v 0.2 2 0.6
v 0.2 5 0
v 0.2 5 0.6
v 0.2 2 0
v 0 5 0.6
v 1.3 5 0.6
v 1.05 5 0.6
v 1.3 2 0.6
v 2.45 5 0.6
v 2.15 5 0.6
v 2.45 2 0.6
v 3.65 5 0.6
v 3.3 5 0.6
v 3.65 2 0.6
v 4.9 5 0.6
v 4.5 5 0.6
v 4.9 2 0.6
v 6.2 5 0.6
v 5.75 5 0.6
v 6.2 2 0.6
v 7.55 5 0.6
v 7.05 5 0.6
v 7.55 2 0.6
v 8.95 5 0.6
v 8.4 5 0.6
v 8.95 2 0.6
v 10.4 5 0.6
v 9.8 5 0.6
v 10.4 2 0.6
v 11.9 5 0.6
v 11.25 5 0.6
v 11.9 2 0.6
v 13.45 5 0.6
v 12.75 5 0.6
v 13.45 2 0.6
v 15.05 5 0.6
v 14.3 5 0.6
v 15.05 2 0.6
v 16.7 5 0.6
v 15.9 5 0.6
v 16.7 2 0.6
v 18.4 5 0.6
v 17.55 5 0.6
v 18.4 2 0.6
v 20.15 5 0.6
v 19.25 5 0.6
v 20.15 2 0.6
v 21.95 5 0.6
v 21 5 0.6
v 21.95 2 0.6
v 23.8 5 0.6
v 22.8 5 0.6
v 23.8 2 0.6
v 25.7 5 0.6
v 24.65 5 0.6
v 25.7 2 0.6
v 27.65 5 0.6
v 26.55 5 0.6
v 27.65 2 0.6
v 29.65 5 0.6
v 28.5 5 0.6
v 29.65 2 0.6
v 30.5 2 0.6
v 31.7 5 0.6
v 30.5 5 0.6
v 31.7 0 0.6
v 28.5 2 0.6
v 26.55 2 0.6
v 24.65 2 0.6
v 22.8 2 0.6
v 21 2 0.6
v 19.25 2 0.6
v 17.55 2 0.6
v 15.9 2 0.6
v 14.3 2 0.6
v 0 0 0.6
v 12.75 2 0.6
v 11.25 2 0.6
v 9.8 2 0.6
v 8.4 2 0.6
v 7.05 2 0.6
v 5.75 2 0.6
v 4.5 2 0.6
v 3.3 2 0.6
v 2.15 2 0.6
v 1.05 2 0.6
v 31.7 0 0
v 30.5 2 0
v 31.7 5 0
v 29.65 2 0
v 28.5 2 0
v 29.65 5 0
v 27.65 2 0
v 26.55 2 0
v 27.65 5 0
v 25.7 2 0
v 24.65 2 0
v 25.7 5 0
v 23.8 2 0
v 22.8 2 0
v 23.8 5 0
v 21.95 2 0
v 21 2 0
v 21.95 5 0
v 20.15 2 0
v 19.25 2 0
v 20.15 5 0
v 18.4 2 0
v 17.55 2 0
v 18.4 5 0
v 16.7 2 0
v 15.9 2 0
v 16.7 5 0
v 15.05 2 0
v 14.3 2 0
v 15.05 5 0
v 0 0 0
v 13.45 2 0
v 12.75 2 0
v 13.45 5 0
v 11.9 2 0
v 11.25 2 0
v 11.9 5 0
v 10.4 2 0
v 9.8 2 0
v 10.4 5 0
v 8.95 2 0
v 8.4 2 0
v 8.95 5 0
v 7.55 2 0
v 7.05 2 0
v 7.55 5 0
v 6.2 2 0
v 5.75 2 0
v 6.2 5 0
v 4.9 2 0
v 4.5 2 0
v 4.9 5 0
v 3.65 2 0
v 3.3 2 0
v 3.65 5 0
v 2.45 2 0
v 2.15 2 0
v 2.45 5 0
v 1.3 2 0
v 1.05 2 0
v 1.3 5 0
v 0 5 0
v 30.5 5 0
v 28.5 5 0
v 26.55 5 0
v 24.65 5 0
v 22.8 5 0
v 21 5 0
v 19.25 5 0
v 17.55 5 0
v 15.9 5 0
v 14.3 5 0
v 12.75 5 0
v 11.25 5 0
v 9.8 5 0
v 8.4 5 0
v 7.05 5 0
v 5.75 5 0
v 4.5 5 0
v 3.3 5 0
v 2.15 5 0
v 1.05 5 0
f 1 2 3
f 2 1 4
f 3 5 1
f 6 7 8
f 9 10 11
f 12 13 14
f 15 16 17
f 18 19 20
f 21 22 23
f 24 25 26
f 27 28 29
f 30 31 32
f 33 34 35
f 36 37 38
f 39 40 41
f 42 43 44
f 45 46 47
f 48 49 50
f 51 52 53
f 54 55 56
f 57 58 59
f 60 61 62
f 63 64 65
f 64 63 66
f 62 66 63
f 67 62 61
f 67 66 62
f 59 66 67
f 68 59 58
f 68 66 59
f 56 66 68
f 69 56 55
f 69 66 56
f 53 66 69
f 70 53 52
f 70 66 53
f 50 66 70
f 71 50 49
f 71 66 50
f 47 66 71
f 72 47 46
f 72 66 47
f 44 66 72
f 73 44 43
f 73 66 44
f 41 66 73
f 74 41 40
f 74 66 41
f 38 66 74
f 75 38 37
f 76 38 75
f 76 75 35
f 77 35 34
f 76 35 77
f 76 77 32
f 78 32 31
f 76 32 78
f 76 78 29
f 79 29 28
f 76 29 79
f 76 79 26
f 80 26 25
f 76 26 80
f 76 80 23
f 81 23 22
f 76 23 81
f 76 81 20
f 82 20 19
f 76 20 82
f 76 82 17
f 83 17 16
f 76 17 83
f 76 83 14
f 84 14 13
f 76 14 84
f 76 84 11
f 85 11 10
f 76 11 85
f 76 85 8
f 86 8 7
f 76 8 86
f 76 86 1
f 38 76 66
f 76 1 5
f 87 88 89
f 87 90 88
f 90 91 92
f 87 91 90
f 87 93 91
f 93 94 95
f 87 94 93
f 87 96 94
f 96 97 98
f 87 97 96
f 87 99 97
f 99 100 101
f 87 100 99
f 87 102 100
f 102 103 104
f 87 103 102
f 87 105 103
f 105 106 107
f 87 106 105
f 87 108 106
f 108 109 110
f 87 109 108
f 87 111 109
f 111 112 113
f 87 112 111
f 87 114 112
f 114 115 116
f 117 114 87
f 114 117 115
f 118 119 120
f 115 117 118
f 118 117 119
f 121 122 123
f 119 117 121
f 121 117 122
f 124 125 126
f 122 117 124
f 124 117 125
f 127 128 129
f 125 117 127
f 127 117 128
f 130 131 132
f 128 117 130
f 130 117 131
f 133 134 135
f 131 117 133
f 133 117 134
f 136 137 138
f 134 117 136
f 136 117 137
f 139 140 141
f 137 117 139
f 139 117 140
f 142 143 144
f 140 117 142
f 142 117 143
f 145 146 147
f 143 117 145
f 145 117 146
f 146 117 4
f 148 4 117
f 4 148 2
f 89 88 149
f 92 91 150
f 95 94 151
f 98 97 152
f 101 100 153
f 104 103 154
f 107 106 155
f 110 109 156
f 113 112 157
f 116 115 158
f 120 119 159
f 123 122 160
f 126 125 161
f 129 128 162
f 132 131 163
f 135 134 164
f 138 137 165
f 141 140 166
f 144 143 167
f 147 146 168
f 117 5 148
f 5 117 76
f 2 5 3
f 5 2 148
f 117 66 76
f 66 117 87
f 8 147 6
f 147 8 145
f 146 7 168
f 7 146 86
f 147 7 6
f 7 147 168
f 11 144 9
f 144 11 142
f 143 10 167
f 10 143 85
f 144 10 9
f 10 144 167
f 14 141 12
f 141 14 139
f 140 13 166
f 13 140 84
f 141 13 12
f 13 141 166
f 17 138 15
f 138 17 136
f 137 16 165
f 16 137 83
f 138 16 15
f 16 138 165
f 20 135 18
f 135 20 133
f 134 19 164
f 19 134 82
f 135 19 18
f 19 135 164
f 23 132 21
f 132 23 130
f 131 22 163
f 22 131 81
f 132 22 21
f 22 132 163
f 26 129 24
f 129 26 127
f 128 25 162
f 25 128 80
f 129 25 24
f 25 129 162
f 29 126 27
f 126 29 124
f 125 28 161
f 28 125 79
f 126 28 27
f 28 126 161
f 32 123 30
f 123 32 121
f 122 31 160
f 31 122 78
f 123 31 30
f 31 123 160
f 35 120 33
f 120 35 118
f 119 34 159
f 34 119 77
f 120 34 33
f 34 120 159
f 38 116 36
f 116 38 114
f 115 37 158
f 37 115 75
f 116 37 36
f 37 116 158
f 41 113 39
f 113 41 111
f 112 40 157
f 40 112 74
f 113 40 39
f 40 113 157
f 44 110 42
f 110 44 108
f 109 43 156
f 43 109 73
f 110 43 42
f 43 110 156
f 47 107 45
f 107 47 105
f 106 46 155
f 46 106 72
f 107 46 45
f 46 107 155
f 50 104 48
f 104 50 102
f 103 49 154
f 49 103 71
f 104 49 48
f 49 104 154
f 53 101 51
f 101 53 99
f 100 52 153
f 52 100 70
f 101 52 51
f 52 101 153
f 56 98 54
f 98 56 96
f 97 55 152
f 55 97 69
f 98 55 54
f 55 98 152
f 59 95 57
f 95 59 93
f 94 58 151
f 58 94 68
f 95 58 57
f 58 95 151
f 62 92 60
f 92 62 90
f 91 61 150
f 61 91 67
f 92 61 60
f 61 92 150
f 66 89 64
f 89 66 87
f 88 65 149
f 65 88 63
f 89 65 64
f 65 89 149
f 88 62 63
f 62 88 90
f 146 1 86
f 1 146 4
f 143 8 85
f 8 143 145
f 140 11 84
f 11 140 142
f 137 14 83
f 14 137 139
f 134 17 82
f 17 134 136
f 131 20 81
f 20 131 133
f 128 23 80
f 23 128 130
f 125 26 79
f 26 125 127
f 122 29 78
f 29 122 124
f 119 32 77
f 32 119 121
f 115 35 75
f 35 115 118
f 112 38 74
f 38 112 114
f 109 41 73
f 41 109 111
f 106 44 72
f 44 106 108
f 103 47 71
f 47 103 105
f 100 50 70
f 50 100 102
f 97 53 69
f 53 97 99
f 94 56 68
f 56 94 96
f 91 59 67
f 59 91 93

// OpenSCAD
// [FL_INDEX: keywords="openscad, 3d_parametric, Calibration_Comb_-_customizable, csg_solid" | COT="Parametric OpenSCAD design from 3DCodeverse"]
// Title: Calibration Comb - customizable

//make a calibration comb any size you want
//for checking slicer and printer settings
//mark peeters 2-1-2014

/* [calibration comb settings] */
//smallest tooth width (mm)
start_w=0.2;
//largest tooth (mm)(not exact but close)
end_w=1;
//tooth width increments(mm)
step_w=.05;
//space between teeth(mm)
spacing=1;
//tooth length(mm)
comb_l=5;
//tooth height(mm)
comb_h=.6;
//solid comb base height(mm)
base=2;


echo("total mm length of comb is",(end_w/step_w+1)*(end_w/2)+(spacing*end_w/step_w));

//make the base
cube([(end_w/step_w+1)*(end_w/2)+(spacing*end_w/step_w),base,comb_h]);

//make the teeth
for (i = [0:step_w:end_w]) {
//echo("tooth # is now",1+i/step_w);//for debug
//echo("tooth W is now",start_w+i);//for debug
translate([(i/step_w+1)*(i/2)+(spacing*i/step_w),0,0])cube([start_w+i,comb_l,comb_h]);
}
